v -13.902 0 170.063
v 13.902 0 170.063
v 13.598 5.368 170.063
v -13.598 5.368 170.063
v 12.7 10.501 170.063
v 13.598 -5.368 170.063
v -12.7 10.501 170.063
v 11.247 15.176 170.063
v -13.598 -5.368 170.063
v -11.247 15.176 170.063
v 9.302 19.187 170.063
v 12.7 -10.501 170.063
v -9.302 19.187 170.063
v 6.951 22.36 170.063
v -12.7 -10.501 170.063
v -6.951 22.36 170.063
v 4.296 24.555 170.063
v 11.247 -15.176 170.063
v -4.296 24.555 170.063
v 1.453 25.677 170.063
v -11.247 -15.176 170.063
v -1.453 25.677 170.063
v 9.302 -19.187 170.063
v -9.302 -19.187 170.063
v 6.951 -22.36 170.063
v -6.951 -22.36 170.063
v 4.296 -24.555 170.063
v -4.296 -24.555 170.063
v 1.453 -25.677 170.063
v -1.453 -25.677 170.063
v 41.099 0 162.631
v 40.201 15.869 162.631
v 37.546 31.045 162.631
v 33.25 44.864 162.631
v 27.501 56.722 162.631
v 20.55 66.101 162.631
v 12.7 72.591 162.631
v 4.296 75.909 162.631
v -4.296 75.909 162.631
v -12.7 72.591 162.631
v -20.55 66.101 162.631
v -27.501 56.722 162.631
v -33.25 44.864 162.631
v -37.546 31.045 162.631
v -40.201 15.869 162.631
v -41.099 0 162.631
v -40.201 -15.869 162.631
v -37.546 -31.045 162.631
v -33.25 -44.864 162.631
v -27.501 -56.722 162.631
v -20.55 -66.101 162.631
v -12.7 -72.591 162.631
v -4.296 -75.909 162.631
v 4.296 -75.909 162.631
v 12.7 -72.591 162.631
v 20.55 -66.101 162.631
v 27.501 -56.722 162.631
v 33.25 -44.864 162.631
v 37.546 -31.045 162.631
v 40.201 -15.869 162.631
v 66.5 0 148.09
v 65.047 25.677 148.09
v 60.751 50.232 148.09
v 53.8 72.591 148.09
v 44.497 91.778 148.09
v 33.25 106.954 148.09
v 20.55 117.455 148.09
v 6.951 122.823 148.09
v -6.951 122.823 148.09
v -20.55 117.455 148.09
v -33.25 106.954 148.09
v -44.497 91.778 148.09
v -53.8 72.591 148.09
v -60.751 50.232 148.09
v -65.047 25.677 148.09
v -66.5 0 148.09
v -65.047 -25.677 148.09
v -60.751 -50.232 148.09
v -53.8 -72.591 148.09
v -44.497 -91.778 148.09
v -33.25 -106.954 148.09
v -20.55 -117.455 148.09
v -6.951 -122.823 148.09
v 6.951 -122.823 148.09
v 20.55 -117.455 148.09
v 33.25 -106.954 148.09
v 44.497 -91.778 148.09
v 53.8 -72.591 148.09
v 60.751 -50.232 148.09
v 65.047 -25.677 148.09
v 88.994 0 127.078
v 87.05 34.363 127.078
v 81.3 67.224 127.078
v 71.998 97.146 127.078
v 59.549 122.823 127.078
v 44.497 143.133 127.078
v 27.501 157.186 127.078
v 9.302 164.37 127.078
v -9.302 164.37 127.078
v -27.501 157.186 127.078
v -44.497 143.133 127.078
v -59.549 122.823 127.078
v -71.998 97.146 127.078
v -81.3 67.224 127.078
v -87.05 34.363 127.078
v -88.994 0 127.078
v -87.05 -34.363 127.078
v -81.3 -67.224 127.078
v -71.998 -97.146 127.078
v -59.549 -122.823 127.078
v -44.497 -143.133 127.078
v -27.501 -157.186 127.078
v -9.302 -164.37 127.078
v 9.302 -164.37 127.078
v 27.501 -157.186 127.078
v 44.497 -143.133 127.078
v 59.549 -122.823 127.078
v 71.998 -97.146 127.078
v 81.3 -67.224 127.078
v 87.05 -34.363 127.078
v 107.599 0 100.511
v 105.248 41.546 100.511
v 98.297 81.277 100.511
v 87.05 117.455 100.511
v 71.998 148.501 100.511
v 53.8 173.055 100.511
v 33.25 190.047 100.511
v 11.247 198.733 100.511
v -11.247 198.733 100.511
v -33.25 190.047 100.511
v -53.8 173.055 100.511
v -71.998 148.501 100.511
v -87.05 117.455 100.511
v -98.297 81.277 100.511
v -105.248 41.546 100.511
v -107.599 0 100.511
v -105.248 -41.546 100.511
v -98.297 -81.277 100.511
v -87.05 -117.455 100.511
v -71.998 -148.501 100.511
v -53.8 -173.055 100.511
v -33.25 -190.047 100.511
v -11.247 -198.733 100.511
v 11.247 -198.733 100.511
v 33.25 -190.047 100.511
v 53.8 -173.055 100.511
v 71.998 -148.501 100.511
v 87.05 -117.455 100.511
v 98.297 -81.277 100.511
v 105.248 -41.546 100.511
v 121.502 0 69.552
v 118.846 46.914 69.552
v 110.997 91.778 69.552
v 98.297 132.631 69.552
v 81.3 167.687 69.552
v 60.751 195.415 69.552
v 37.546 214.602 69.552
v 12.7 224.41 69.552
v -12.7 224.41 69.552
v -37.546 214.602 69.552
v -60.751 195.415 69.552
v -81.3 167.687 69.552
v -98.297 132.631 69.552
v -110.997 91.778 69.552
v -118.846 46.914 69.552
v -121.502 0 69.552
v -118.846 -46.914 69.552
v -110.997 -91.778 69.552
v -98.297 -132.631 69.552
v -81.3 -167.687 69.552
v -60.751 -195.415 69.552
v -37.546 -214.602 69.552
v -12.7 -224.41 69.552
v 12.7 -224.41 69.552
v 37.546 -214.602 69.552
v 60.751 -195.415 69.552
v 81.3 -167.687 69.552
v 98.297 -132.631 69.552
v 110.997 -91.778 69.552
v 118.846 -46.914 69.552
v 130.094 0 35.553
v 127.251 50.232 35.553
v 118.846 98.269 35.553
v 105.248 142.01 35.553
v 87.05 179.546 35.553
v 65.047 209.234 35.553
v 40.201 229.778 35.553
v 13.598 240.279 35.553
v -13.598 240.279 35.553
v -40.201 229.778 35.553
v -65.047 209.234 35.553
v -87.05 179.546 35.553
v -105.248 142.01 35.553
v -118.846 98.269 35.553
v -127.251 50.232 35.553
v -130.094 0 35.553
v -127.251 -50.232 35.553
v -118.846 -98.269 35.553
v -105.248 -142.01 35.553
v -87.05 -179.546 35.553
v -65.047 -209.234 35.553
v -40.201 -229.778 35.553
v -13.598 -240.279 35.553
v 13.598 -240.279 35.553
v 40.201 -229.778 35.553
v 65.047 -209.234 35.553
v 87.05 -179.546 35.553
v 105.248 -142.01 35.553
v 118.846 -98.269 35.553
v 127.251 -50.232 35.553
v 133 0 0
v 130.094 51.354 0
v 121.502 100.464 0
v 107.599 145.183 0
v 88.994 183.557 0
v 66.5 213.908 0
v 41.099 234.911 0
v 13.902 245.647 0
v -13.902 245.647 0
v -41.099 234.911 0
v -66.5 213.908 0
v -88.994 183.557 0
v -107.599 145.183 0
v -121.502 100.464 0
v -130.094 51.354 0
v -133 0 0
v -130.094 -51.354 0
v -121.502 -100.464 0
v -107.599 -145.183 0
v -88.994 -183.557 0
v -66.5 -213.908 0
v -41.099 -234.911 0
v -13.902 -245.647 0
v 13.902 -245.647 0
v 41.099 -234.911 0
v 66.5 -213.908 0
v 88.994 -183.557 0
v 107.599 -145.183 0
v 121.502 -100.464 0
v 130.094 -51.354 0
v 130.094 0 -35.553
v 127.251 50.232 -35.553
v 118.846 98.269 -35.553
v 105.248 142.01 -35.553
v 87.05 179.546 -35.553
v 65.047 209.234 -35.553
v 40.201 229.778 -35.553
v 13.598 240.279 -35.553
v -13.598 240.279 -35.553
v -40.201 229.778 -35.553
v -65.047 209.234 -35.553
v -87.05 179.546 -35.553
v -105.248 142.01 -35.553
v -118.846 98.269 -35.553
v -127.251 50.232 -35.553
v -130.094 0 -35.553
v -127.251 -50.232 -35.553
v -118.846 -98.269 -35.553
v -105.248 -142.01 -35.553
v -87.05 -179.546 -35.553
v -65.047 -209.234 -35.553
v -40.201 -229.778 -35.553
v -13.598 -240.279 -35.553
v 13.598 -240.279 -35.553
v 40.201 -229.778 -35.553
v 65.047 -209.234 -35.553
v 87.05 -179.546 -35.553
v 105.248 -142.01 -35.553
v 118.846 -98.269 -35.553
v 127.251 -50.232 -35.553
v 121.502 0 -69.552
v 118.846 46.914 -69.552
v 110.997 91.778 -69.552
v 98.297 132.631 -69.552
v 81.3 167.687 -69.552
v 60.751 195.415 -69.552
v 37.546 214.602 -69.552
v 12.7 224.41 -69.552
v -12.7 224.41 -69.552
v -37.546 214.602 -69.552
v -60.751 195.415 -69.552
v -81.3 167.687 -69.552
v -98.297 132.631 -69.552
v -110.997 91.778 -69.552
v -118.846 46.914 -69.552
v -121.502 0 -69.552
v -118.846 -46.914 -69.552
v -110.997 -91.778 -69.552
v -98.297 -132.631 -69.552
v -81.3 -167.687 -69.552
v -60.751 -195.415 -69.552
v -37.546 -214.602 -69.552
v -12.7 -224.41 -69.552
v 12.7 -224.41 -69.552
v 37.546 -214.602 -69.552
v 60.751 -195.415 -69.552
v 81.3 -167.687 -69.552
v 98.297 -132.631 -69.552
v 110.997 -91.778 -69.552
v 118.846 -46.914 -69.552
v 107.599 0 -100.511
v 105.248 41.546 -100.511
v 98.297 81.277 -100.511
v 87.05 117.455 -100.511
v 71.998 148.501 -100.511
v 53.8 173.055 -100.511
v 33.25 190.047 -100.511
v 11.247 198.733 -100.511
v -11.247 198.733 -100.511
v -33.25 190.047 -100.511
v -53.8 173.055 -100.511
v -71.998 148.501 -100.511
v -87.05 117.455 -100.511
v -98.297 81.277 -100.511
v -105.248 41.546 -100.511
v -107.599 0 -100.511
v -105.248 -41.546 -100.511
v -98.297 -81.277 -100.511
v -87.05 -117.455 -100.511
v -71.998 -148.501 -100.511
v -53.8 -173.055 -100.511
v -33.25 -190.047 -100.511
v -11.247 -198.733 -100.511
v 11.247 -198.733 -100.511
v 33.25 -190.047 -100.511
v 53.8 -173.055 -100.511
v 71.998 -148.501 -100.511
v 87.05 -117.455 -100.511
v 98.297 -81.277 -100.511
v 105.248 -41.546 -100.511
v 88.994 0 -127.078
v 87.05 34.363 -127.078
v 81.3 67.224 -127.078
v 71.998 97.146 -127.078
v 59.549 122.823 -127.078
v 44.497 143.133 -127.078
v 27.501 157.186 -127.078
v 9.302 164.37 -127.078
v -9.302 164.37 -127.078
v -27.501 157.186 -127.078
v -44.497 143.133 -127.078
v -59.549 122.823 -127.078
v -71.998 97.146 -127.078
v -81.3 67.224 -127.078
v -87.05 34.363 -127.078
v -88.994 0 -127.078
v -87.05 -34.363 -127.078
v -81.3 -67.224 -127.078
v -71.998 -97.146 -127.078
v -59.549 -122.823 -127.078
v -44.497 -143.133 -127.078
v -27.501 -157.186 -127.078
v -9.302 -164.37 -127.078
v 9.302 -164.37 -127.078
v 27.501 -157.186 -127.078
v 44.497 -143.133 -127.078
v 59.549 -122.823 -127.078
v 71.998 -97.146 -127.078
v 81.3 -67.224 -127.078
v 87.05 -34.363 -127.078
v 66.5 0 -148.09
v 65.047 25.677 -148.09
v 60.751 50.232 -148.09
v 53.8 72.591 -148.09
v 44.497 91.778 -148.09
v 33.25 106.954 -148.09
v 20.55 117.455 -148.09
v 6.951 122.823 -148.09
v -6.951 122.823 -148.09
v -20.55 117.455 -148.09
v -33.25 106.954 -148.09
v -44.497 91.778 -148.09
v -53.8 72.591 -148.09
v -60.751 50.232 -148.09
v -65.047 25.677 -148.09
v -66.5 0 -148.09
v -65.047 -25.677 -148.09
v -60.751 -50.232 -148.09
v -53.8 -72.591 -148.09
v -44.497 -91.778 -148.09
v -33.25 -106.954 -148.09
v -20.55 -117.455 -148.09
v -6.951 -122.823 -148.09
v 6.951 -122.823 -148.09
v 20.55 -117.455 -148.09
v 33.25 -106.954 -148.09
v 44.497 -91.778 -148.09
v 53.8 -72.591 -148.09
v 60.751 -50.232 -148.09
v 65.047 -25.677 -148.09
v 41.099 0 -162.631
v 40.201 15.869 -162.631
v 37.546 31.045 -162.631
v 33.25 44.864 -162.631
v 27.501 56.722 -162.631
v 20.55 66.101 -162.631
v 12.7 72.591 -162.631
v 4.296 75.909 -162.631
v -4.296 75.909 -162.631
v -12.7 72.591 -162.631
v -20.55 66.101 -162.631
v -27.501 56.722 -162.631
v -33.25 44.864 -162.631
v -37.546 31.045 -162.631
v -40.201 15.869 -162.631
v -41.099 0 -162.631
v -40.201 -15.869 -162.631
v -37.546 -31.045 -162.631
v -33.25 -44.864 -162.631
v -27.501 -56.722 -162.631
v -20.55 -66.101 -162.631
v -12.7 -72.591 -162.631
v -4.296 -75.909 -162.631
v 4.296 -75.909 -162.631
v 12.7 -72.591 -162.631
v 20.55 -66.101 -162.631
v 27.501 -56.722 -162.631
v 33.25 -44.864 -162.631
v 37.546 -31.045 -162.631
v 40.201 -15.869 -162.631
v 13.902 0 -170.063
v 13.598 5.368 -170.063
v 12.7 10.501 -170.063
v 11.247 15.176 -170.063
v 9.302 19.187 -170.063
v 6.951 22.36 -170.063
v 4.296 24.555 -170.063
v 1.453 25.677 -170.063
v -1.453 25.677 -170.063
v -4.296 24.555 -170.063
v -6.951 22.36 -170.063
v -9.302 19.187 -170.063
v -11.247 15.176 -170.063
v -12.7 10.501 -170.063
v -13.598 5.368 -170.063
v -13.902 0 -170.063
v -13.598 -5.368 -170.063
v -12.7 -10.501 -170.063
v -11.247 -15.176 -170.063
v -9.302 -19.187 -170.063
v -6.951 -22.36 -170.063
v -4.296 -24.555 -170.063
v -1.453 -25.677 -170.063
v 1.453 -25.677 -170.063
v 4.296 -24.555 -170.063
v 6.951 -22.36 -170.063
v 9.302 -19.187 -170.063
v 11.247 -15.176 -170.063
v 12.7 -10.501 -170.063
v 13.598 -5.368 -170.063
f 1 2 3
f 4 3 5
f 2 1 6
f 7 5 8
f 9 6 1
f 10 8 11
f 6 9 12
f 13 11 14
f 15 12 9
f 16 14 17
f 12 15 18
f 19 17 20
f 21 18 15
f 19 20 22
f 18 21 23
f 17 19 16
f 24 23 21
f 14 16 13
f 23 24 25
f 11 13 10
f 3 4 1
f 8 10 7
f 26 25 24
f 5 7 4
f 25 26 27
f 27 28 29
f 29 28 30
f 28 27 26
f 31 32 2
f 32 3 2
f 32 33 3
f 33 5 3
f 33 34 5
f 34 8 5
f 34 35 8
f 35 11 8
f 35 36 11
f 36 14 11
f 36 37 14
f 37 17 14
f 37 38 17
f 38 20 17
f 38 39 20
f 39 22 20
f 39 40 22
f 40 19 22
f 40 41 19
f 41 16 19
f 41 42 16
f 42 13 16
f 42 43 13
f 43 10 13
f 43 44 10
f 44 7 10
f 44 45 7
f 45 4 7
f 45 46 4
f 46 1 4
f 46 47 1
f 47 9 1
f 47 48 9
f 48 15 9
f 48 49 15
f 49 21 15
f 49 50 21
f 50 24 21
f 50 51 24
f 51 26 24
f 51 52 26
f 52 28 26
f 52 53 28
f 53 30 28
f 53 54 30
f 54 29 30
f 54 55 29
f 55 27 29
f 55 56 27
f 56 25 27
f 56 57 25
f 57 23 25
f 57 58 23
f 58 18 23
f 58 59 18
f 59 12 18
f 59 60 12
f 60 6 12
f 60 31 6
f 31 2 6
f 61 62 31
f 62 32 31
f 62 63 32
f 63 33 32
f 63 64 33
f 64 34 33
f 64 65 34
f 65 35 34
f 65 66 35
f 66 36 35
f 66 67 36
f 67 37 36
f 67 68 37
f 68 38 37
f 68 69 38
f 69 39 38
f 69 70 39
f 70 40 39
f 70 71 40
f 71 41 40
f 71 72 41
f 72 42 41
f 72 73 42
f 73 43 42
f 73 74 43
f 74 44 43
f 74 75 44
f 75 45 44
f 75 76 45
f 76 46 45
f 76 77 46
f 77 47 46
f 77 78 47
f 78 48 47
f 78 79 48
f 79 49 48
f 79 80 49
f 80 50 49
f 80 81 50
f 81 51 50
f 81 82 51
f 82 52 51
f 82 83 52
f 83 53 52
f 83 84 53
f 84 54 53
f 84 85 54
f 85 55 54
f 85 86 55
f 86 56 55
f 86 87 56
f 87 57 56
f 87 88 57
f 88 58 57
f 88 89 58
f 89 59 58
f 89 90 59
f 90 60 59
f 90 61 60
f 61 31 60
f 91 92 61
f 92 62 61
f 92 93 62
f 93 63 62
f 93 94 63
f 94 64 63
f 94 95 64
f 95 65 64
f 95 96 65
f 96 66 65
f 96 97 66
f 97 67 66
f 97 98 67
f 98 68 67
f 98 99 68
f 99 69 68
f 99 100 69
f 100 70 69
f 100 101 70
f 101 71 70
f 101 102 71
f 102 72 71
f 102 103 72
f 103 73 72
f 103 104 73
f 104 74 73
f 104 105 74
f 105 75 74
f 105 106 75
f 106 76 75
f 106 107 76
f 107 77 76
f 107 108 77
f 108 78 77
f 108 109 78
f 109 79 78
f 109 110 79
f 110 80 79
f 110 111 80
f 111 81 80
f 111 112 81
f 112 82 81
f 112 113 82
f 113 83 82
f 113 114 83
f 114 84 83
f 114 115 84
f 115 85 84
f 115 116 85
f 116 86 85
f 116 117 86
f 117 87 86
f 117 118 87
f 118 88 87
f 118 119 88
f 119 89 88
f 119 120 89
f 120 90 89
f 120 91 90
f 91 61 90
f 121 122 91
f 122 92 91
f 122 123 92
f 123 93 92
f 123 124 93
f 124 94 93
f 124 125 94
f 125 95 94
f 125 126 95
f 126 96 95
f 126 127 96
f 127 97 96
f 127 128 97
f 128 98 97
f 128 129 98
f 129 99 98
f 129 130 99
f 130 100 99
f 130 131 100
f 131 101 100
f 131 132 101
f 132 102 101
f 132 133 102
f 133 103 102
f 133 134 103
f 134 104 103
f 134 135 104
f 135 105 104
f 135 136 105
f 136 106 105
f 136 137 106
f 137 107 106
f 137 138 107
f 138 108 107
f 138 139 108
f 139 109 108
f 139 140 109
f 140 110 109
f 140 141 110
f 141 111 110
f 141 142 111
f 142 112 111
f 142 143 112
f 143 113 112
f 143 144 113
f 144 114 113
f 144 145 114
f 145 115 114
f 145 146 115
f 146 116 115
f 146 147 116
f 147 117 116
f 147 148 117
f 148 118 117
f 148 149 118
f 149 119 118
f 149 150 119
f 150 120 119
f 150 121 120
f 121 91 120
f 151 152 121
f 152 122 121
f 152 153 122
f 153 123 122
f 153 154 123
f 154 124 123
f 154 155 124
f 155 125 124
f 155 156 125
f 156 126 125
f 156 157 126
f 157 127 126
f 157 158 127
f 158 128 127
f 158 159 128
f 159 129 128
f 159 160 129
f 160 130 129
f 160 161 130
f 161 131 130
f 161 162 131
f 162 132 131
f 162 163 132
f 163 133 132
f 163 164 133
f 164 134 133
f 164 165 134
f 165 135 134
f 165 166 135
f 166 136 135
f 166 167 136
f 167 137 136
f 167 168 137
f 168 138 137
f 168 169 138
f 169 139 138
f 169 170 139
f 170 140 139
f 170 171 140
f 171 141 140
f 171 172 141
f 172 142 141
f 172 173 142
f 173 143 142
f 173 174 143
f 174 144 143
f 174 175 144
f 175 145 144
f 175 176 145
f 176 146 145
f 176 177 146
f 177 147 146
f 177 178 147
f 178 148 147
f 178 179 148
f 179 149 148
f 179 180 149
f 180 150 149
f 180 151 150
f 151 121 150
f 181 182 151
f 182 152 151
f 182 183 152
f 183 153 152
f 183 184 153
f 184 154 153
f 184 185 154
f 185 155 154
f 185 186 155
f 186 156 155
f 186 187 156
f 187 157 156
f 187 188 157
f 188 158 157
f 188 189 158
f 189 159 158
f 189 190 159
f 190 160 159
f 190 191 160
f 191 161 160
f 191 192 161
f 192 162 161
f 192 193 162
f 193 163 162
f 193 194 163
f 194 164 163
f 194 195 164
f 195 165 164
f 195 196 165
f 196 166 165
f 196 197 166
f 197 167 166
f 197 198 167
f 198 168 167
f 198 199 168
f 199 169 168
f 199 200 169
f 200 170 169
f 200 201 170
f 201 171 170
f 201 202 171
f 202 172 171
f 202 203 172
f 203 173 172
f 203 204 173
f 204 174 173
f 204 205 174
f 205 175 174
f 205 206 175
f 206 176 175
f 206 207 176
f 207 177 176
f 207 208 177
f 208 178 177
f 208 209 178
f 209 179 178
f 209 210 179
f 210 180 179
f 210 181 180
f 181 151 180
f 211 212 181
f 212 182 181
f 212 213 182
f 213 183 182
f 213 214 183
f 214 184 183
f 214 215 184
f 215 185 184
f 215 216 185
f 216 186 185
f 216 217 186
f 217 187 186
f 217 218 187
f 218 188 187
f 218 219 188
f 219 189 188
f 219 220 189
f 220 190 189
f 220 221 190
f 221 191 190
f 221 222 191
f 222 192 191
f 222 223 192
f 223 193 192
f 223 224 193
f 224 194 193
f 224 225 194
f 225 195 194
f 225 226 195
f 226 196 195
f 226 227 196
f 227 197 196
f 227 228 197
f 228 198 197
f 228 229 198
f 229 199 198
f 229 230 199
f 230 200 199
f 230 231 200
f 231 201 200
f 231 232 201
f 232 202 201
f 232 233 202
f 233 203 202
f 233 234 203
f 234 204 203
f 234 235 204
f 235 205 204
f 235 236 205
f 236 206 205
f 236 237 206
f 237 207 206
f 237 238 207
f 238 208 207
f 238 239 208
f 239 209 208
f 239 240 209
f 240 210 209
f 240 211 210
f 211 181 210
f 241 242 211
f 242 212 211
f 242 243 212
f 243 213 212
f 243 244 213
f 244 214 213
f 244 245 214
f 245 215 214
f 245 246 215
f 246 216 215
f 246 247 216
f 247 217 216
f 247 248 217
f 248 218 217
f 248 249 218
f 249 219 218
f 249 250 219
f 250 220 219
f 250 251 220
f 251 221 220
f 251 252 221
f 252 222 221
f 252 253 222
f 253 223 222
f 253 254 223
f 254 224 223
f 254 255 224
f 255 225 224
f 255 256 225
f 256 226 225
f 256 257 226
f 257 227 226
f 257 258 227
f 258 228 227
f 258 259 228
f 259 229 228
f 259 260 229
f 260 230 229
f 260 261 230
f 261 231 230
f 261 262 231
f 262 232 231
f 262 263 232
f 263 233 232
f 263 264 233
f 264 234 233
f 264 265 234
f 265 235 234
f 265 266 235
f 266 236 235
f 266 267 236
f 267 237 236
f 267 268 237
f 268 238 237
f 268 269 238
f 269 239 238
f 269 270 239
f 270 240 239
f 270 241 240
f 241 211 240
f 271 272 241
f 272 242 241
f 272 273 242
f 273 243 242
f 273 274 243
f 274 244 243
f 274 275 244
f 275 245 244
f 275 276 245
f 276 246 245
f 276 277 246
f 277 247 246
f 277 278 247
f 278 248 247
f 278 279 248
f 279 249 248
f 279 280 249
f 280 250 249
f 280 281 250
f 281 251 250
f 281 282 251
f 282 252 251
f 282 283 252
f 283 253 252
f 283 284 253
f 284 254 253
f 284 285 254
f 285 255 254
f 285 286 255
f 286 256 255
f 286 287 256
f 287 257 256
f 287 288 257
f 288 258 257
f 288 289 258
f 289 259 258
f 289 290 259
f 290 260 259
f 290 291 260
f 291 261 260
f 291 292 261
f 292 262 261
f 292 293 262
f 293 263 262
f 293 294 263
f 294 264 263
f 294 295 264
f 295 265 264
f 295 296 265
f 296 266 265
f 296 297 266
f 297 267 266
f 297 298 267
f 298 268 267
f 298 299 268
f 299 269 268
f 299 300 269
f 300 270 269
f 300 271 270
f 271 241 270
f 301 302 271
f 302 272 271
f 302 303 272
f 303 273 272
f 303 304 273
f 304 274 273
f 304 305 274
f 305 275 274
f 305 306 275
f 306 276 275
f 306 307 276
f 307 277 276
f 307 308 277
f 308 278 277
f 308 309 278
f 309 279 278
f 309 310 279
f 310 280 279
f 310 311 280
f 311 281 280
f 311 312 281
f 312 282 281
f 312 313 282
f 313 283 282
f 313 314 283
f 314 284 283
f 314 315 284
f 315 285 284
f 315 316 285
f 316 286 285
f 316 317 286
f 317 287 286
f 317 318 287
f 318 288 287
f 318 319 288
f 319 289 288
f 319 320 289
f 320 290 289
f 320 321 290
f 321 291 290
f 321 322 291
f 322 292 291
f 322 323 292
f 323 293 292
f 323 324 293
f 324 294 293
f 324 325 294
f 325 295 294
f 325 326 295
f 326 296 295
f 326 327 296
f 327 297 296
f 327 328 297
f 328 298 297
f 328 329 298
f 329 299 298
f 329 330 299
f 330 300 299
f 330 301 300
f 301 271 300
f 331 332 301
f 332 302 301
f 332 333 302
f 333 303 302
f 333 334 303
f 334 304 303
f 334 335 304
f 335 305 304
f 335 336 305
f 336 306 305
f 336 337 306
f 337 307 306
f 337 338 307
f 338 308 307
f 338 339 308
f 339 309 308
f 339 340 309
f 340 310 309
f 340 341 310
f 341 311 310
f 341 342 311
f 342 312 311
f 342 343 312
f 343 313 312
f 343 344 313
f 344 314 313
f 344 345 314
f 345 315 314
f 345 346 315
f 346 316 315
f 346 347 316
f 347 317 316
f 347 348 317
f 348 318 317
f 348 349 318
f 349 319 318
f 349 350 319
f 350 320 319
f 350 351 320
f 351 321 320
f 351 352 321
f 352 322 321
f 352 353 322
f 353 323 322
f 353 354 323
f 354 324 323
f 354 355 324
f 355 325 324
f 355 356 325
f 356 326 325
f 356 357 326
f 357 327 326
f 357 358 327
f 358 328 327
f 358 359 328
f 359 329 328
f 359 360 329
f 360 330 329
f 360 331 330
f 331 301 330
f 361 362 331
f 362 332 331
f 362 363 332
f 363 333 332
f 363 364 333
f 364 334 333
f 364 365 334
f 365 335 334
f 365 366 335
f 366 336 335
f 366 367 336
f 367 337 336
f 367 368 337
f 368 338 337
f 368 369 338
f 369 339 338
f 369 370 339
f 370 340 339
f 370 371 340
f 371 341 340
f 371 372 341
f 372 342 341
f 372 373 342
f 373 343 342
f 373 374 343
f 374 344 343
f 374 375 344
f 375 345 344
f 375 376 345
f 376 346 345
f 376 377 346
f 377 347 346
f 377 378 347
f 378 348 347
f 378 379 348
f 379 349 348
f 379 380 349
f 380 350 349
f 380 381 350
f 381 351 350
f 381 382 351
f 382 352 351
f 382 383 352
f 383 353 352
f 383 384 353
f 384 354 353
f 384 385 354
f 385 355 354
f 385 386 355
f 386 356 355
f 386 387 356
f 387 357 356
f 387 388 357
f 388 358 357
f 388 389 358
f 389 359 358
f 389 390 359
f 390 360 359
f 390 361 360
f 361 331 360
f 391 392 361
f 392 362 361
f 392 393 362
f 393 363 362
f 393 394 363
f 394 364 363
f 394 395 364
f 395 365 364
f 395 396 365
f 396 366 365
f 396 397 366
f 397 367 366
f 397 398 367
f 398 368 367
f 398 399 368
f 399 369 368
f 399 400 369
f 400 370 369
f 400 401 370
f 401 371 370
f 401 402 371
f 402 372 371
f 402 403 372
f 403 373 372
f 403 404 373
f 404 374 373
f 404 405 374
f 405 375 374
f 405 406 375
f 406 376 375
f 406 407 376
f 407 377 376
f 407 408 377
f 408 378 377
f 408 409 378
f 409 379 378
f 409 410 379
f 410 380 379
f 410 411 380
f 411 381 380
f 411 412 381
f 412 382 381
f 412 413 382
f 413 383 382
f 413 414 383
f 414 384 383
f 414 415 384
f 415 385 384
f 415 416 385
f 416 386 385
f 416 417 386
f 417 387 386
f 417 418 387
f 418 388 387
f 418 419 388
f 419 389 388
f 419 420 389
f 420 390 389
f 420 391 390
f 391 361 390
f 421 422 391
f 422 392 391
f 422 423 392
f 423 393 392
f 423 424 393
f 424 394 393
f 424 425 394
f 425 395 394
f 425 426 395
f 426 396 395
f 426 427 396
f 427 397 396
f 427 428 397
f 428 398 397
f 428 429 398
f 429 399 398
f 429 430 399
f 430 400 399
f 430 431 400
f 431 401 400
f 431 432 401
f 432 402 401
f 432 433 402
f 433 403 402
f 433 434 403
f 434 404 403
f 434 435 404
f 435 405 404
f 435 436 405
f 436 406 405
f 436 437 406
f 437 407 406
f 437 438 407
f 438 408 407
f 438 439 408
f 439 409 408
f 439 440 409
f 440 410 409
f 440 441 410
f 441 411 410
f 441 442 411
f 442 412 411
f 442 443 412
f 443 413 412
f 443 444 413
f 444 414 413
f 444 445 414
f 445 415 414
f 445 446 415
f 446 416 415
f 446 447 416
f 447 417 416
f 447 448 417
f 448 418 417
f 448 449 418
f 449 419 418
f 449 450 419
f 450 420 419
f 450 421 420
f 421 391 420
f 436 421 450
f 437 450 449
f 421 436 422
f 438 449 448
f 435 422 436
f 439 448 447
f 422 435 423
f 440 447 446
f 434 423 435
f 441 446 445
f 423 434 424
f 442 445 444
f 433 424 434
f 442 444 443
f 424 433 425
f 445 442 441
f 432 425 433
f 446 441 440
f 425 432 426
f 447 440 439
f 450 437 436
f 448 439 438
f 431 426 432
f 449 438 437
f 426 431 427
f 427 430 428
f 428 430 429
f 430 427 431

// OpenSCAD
// Generated by SolidPython 1.0.1 on 2020-07-29 00:46:47


scale(v = [7, 13, 9]) {
	sphere(r = 19);
}
/***********************************************
*********      SolidPython code:      **********
************************************************
 
# import packages: SolidPython
from solid import *
from solid.utils import *
from itertools import chain, combinations, permutations


class Resize:

    def __init__(self, scad_file):
        self.scad_file = scad_file
        #self.scad_file = import_scad(scad_file)
        # cone/cylinder param:
        self.r1 = 0
        self.r2 = 0
        self.h = 0
        # rectangular prism param:
        self.w = 0
        self.l = 0
        # ellipse param:
        self.r = 0

    # import OpenScad code (file name corresponds to shape)


    # classify shape + parameters
    def assign(self, param1, param2, param3):
        if self.scad_file == 'cone.scad':
            self.r1 = param1
            self.r2 = param2
            self.h = param3
        elif self.scad_file == 'cylinder.scad':
            self.r1 = param1
            self.r2 = param2
            self.h = param3
        elif self.scad_file == 'rectangularPrism.scad':
            self.h = param1
            self.l = param2
            self.w = param3
        else:
            self.r = param1
            self.h = param2

    # resize parameters
    def iterate(self):
        x = range(3, 20, 2)
        i = 1
        if self.scad_file == 'cone.scad':
            tempList = list(permutations(x, 2))
            for temp in tempList:
                param1 = temp[0]
                param2 = temp[1]
                filepath = 'produced_scad_files/' + 'cone' + str(param1) + '_' + str(param2) + '_' + '.scad'
                scad_render_to_file(cylinder(h=param1, r1=param2, r2=0), filepath)

        elif self.scad_file == 'cylinder.scad':
            tempList = list(permutations(x, 3))
            for temp in tempList:
                param1 = temp[0]
                param2 = temp[1]
                filepath = 'produced_scad_files/' + 'cylinder' + str(param1) + '_' + str(param2) + '_' + '.scad'
                scad_render_to_file(cylinder(h=param1, r1=param2, r2=param2), filepath)

        elif self.scad_file == 'rectangularPrism.scad':
            tempList = list(permutations(x, 3))
            for temp in tempList:
                param1 = temp[0]
                param2 = temp[1]
                param3 = temp[2]
                filepath = 'produced_scad_files/' + 'rectangularPrism' + str(param1) + '_' + str(param2) + '_' + str(
                    param3) + '.scad'
                scad_render_to_file(cube(size=(param1, param2, param3)), filepath)

        elif self.scad_file == 'ellipse.scad':
            tempList = list(permutations(x, 4))
            for temp in tempList:
                param1 = temp[0]
                param2 = temp[1]
                param3 = temp[2]
                param4 = temp[3]
                filepath = 'produced_scad_files/' + 'ellipse' + str(param1) + '_' + str(param2) + '_' + str(param3) + '_' + str(param4) + '.scad'
                scad_render_to_file(scale([param1, param2, param3])(sphere(r=param4)), filepath)

    def render_to_scadfile(self):
        scad_render_to_file(scad, 'example.scad') 
 
************************************************/
